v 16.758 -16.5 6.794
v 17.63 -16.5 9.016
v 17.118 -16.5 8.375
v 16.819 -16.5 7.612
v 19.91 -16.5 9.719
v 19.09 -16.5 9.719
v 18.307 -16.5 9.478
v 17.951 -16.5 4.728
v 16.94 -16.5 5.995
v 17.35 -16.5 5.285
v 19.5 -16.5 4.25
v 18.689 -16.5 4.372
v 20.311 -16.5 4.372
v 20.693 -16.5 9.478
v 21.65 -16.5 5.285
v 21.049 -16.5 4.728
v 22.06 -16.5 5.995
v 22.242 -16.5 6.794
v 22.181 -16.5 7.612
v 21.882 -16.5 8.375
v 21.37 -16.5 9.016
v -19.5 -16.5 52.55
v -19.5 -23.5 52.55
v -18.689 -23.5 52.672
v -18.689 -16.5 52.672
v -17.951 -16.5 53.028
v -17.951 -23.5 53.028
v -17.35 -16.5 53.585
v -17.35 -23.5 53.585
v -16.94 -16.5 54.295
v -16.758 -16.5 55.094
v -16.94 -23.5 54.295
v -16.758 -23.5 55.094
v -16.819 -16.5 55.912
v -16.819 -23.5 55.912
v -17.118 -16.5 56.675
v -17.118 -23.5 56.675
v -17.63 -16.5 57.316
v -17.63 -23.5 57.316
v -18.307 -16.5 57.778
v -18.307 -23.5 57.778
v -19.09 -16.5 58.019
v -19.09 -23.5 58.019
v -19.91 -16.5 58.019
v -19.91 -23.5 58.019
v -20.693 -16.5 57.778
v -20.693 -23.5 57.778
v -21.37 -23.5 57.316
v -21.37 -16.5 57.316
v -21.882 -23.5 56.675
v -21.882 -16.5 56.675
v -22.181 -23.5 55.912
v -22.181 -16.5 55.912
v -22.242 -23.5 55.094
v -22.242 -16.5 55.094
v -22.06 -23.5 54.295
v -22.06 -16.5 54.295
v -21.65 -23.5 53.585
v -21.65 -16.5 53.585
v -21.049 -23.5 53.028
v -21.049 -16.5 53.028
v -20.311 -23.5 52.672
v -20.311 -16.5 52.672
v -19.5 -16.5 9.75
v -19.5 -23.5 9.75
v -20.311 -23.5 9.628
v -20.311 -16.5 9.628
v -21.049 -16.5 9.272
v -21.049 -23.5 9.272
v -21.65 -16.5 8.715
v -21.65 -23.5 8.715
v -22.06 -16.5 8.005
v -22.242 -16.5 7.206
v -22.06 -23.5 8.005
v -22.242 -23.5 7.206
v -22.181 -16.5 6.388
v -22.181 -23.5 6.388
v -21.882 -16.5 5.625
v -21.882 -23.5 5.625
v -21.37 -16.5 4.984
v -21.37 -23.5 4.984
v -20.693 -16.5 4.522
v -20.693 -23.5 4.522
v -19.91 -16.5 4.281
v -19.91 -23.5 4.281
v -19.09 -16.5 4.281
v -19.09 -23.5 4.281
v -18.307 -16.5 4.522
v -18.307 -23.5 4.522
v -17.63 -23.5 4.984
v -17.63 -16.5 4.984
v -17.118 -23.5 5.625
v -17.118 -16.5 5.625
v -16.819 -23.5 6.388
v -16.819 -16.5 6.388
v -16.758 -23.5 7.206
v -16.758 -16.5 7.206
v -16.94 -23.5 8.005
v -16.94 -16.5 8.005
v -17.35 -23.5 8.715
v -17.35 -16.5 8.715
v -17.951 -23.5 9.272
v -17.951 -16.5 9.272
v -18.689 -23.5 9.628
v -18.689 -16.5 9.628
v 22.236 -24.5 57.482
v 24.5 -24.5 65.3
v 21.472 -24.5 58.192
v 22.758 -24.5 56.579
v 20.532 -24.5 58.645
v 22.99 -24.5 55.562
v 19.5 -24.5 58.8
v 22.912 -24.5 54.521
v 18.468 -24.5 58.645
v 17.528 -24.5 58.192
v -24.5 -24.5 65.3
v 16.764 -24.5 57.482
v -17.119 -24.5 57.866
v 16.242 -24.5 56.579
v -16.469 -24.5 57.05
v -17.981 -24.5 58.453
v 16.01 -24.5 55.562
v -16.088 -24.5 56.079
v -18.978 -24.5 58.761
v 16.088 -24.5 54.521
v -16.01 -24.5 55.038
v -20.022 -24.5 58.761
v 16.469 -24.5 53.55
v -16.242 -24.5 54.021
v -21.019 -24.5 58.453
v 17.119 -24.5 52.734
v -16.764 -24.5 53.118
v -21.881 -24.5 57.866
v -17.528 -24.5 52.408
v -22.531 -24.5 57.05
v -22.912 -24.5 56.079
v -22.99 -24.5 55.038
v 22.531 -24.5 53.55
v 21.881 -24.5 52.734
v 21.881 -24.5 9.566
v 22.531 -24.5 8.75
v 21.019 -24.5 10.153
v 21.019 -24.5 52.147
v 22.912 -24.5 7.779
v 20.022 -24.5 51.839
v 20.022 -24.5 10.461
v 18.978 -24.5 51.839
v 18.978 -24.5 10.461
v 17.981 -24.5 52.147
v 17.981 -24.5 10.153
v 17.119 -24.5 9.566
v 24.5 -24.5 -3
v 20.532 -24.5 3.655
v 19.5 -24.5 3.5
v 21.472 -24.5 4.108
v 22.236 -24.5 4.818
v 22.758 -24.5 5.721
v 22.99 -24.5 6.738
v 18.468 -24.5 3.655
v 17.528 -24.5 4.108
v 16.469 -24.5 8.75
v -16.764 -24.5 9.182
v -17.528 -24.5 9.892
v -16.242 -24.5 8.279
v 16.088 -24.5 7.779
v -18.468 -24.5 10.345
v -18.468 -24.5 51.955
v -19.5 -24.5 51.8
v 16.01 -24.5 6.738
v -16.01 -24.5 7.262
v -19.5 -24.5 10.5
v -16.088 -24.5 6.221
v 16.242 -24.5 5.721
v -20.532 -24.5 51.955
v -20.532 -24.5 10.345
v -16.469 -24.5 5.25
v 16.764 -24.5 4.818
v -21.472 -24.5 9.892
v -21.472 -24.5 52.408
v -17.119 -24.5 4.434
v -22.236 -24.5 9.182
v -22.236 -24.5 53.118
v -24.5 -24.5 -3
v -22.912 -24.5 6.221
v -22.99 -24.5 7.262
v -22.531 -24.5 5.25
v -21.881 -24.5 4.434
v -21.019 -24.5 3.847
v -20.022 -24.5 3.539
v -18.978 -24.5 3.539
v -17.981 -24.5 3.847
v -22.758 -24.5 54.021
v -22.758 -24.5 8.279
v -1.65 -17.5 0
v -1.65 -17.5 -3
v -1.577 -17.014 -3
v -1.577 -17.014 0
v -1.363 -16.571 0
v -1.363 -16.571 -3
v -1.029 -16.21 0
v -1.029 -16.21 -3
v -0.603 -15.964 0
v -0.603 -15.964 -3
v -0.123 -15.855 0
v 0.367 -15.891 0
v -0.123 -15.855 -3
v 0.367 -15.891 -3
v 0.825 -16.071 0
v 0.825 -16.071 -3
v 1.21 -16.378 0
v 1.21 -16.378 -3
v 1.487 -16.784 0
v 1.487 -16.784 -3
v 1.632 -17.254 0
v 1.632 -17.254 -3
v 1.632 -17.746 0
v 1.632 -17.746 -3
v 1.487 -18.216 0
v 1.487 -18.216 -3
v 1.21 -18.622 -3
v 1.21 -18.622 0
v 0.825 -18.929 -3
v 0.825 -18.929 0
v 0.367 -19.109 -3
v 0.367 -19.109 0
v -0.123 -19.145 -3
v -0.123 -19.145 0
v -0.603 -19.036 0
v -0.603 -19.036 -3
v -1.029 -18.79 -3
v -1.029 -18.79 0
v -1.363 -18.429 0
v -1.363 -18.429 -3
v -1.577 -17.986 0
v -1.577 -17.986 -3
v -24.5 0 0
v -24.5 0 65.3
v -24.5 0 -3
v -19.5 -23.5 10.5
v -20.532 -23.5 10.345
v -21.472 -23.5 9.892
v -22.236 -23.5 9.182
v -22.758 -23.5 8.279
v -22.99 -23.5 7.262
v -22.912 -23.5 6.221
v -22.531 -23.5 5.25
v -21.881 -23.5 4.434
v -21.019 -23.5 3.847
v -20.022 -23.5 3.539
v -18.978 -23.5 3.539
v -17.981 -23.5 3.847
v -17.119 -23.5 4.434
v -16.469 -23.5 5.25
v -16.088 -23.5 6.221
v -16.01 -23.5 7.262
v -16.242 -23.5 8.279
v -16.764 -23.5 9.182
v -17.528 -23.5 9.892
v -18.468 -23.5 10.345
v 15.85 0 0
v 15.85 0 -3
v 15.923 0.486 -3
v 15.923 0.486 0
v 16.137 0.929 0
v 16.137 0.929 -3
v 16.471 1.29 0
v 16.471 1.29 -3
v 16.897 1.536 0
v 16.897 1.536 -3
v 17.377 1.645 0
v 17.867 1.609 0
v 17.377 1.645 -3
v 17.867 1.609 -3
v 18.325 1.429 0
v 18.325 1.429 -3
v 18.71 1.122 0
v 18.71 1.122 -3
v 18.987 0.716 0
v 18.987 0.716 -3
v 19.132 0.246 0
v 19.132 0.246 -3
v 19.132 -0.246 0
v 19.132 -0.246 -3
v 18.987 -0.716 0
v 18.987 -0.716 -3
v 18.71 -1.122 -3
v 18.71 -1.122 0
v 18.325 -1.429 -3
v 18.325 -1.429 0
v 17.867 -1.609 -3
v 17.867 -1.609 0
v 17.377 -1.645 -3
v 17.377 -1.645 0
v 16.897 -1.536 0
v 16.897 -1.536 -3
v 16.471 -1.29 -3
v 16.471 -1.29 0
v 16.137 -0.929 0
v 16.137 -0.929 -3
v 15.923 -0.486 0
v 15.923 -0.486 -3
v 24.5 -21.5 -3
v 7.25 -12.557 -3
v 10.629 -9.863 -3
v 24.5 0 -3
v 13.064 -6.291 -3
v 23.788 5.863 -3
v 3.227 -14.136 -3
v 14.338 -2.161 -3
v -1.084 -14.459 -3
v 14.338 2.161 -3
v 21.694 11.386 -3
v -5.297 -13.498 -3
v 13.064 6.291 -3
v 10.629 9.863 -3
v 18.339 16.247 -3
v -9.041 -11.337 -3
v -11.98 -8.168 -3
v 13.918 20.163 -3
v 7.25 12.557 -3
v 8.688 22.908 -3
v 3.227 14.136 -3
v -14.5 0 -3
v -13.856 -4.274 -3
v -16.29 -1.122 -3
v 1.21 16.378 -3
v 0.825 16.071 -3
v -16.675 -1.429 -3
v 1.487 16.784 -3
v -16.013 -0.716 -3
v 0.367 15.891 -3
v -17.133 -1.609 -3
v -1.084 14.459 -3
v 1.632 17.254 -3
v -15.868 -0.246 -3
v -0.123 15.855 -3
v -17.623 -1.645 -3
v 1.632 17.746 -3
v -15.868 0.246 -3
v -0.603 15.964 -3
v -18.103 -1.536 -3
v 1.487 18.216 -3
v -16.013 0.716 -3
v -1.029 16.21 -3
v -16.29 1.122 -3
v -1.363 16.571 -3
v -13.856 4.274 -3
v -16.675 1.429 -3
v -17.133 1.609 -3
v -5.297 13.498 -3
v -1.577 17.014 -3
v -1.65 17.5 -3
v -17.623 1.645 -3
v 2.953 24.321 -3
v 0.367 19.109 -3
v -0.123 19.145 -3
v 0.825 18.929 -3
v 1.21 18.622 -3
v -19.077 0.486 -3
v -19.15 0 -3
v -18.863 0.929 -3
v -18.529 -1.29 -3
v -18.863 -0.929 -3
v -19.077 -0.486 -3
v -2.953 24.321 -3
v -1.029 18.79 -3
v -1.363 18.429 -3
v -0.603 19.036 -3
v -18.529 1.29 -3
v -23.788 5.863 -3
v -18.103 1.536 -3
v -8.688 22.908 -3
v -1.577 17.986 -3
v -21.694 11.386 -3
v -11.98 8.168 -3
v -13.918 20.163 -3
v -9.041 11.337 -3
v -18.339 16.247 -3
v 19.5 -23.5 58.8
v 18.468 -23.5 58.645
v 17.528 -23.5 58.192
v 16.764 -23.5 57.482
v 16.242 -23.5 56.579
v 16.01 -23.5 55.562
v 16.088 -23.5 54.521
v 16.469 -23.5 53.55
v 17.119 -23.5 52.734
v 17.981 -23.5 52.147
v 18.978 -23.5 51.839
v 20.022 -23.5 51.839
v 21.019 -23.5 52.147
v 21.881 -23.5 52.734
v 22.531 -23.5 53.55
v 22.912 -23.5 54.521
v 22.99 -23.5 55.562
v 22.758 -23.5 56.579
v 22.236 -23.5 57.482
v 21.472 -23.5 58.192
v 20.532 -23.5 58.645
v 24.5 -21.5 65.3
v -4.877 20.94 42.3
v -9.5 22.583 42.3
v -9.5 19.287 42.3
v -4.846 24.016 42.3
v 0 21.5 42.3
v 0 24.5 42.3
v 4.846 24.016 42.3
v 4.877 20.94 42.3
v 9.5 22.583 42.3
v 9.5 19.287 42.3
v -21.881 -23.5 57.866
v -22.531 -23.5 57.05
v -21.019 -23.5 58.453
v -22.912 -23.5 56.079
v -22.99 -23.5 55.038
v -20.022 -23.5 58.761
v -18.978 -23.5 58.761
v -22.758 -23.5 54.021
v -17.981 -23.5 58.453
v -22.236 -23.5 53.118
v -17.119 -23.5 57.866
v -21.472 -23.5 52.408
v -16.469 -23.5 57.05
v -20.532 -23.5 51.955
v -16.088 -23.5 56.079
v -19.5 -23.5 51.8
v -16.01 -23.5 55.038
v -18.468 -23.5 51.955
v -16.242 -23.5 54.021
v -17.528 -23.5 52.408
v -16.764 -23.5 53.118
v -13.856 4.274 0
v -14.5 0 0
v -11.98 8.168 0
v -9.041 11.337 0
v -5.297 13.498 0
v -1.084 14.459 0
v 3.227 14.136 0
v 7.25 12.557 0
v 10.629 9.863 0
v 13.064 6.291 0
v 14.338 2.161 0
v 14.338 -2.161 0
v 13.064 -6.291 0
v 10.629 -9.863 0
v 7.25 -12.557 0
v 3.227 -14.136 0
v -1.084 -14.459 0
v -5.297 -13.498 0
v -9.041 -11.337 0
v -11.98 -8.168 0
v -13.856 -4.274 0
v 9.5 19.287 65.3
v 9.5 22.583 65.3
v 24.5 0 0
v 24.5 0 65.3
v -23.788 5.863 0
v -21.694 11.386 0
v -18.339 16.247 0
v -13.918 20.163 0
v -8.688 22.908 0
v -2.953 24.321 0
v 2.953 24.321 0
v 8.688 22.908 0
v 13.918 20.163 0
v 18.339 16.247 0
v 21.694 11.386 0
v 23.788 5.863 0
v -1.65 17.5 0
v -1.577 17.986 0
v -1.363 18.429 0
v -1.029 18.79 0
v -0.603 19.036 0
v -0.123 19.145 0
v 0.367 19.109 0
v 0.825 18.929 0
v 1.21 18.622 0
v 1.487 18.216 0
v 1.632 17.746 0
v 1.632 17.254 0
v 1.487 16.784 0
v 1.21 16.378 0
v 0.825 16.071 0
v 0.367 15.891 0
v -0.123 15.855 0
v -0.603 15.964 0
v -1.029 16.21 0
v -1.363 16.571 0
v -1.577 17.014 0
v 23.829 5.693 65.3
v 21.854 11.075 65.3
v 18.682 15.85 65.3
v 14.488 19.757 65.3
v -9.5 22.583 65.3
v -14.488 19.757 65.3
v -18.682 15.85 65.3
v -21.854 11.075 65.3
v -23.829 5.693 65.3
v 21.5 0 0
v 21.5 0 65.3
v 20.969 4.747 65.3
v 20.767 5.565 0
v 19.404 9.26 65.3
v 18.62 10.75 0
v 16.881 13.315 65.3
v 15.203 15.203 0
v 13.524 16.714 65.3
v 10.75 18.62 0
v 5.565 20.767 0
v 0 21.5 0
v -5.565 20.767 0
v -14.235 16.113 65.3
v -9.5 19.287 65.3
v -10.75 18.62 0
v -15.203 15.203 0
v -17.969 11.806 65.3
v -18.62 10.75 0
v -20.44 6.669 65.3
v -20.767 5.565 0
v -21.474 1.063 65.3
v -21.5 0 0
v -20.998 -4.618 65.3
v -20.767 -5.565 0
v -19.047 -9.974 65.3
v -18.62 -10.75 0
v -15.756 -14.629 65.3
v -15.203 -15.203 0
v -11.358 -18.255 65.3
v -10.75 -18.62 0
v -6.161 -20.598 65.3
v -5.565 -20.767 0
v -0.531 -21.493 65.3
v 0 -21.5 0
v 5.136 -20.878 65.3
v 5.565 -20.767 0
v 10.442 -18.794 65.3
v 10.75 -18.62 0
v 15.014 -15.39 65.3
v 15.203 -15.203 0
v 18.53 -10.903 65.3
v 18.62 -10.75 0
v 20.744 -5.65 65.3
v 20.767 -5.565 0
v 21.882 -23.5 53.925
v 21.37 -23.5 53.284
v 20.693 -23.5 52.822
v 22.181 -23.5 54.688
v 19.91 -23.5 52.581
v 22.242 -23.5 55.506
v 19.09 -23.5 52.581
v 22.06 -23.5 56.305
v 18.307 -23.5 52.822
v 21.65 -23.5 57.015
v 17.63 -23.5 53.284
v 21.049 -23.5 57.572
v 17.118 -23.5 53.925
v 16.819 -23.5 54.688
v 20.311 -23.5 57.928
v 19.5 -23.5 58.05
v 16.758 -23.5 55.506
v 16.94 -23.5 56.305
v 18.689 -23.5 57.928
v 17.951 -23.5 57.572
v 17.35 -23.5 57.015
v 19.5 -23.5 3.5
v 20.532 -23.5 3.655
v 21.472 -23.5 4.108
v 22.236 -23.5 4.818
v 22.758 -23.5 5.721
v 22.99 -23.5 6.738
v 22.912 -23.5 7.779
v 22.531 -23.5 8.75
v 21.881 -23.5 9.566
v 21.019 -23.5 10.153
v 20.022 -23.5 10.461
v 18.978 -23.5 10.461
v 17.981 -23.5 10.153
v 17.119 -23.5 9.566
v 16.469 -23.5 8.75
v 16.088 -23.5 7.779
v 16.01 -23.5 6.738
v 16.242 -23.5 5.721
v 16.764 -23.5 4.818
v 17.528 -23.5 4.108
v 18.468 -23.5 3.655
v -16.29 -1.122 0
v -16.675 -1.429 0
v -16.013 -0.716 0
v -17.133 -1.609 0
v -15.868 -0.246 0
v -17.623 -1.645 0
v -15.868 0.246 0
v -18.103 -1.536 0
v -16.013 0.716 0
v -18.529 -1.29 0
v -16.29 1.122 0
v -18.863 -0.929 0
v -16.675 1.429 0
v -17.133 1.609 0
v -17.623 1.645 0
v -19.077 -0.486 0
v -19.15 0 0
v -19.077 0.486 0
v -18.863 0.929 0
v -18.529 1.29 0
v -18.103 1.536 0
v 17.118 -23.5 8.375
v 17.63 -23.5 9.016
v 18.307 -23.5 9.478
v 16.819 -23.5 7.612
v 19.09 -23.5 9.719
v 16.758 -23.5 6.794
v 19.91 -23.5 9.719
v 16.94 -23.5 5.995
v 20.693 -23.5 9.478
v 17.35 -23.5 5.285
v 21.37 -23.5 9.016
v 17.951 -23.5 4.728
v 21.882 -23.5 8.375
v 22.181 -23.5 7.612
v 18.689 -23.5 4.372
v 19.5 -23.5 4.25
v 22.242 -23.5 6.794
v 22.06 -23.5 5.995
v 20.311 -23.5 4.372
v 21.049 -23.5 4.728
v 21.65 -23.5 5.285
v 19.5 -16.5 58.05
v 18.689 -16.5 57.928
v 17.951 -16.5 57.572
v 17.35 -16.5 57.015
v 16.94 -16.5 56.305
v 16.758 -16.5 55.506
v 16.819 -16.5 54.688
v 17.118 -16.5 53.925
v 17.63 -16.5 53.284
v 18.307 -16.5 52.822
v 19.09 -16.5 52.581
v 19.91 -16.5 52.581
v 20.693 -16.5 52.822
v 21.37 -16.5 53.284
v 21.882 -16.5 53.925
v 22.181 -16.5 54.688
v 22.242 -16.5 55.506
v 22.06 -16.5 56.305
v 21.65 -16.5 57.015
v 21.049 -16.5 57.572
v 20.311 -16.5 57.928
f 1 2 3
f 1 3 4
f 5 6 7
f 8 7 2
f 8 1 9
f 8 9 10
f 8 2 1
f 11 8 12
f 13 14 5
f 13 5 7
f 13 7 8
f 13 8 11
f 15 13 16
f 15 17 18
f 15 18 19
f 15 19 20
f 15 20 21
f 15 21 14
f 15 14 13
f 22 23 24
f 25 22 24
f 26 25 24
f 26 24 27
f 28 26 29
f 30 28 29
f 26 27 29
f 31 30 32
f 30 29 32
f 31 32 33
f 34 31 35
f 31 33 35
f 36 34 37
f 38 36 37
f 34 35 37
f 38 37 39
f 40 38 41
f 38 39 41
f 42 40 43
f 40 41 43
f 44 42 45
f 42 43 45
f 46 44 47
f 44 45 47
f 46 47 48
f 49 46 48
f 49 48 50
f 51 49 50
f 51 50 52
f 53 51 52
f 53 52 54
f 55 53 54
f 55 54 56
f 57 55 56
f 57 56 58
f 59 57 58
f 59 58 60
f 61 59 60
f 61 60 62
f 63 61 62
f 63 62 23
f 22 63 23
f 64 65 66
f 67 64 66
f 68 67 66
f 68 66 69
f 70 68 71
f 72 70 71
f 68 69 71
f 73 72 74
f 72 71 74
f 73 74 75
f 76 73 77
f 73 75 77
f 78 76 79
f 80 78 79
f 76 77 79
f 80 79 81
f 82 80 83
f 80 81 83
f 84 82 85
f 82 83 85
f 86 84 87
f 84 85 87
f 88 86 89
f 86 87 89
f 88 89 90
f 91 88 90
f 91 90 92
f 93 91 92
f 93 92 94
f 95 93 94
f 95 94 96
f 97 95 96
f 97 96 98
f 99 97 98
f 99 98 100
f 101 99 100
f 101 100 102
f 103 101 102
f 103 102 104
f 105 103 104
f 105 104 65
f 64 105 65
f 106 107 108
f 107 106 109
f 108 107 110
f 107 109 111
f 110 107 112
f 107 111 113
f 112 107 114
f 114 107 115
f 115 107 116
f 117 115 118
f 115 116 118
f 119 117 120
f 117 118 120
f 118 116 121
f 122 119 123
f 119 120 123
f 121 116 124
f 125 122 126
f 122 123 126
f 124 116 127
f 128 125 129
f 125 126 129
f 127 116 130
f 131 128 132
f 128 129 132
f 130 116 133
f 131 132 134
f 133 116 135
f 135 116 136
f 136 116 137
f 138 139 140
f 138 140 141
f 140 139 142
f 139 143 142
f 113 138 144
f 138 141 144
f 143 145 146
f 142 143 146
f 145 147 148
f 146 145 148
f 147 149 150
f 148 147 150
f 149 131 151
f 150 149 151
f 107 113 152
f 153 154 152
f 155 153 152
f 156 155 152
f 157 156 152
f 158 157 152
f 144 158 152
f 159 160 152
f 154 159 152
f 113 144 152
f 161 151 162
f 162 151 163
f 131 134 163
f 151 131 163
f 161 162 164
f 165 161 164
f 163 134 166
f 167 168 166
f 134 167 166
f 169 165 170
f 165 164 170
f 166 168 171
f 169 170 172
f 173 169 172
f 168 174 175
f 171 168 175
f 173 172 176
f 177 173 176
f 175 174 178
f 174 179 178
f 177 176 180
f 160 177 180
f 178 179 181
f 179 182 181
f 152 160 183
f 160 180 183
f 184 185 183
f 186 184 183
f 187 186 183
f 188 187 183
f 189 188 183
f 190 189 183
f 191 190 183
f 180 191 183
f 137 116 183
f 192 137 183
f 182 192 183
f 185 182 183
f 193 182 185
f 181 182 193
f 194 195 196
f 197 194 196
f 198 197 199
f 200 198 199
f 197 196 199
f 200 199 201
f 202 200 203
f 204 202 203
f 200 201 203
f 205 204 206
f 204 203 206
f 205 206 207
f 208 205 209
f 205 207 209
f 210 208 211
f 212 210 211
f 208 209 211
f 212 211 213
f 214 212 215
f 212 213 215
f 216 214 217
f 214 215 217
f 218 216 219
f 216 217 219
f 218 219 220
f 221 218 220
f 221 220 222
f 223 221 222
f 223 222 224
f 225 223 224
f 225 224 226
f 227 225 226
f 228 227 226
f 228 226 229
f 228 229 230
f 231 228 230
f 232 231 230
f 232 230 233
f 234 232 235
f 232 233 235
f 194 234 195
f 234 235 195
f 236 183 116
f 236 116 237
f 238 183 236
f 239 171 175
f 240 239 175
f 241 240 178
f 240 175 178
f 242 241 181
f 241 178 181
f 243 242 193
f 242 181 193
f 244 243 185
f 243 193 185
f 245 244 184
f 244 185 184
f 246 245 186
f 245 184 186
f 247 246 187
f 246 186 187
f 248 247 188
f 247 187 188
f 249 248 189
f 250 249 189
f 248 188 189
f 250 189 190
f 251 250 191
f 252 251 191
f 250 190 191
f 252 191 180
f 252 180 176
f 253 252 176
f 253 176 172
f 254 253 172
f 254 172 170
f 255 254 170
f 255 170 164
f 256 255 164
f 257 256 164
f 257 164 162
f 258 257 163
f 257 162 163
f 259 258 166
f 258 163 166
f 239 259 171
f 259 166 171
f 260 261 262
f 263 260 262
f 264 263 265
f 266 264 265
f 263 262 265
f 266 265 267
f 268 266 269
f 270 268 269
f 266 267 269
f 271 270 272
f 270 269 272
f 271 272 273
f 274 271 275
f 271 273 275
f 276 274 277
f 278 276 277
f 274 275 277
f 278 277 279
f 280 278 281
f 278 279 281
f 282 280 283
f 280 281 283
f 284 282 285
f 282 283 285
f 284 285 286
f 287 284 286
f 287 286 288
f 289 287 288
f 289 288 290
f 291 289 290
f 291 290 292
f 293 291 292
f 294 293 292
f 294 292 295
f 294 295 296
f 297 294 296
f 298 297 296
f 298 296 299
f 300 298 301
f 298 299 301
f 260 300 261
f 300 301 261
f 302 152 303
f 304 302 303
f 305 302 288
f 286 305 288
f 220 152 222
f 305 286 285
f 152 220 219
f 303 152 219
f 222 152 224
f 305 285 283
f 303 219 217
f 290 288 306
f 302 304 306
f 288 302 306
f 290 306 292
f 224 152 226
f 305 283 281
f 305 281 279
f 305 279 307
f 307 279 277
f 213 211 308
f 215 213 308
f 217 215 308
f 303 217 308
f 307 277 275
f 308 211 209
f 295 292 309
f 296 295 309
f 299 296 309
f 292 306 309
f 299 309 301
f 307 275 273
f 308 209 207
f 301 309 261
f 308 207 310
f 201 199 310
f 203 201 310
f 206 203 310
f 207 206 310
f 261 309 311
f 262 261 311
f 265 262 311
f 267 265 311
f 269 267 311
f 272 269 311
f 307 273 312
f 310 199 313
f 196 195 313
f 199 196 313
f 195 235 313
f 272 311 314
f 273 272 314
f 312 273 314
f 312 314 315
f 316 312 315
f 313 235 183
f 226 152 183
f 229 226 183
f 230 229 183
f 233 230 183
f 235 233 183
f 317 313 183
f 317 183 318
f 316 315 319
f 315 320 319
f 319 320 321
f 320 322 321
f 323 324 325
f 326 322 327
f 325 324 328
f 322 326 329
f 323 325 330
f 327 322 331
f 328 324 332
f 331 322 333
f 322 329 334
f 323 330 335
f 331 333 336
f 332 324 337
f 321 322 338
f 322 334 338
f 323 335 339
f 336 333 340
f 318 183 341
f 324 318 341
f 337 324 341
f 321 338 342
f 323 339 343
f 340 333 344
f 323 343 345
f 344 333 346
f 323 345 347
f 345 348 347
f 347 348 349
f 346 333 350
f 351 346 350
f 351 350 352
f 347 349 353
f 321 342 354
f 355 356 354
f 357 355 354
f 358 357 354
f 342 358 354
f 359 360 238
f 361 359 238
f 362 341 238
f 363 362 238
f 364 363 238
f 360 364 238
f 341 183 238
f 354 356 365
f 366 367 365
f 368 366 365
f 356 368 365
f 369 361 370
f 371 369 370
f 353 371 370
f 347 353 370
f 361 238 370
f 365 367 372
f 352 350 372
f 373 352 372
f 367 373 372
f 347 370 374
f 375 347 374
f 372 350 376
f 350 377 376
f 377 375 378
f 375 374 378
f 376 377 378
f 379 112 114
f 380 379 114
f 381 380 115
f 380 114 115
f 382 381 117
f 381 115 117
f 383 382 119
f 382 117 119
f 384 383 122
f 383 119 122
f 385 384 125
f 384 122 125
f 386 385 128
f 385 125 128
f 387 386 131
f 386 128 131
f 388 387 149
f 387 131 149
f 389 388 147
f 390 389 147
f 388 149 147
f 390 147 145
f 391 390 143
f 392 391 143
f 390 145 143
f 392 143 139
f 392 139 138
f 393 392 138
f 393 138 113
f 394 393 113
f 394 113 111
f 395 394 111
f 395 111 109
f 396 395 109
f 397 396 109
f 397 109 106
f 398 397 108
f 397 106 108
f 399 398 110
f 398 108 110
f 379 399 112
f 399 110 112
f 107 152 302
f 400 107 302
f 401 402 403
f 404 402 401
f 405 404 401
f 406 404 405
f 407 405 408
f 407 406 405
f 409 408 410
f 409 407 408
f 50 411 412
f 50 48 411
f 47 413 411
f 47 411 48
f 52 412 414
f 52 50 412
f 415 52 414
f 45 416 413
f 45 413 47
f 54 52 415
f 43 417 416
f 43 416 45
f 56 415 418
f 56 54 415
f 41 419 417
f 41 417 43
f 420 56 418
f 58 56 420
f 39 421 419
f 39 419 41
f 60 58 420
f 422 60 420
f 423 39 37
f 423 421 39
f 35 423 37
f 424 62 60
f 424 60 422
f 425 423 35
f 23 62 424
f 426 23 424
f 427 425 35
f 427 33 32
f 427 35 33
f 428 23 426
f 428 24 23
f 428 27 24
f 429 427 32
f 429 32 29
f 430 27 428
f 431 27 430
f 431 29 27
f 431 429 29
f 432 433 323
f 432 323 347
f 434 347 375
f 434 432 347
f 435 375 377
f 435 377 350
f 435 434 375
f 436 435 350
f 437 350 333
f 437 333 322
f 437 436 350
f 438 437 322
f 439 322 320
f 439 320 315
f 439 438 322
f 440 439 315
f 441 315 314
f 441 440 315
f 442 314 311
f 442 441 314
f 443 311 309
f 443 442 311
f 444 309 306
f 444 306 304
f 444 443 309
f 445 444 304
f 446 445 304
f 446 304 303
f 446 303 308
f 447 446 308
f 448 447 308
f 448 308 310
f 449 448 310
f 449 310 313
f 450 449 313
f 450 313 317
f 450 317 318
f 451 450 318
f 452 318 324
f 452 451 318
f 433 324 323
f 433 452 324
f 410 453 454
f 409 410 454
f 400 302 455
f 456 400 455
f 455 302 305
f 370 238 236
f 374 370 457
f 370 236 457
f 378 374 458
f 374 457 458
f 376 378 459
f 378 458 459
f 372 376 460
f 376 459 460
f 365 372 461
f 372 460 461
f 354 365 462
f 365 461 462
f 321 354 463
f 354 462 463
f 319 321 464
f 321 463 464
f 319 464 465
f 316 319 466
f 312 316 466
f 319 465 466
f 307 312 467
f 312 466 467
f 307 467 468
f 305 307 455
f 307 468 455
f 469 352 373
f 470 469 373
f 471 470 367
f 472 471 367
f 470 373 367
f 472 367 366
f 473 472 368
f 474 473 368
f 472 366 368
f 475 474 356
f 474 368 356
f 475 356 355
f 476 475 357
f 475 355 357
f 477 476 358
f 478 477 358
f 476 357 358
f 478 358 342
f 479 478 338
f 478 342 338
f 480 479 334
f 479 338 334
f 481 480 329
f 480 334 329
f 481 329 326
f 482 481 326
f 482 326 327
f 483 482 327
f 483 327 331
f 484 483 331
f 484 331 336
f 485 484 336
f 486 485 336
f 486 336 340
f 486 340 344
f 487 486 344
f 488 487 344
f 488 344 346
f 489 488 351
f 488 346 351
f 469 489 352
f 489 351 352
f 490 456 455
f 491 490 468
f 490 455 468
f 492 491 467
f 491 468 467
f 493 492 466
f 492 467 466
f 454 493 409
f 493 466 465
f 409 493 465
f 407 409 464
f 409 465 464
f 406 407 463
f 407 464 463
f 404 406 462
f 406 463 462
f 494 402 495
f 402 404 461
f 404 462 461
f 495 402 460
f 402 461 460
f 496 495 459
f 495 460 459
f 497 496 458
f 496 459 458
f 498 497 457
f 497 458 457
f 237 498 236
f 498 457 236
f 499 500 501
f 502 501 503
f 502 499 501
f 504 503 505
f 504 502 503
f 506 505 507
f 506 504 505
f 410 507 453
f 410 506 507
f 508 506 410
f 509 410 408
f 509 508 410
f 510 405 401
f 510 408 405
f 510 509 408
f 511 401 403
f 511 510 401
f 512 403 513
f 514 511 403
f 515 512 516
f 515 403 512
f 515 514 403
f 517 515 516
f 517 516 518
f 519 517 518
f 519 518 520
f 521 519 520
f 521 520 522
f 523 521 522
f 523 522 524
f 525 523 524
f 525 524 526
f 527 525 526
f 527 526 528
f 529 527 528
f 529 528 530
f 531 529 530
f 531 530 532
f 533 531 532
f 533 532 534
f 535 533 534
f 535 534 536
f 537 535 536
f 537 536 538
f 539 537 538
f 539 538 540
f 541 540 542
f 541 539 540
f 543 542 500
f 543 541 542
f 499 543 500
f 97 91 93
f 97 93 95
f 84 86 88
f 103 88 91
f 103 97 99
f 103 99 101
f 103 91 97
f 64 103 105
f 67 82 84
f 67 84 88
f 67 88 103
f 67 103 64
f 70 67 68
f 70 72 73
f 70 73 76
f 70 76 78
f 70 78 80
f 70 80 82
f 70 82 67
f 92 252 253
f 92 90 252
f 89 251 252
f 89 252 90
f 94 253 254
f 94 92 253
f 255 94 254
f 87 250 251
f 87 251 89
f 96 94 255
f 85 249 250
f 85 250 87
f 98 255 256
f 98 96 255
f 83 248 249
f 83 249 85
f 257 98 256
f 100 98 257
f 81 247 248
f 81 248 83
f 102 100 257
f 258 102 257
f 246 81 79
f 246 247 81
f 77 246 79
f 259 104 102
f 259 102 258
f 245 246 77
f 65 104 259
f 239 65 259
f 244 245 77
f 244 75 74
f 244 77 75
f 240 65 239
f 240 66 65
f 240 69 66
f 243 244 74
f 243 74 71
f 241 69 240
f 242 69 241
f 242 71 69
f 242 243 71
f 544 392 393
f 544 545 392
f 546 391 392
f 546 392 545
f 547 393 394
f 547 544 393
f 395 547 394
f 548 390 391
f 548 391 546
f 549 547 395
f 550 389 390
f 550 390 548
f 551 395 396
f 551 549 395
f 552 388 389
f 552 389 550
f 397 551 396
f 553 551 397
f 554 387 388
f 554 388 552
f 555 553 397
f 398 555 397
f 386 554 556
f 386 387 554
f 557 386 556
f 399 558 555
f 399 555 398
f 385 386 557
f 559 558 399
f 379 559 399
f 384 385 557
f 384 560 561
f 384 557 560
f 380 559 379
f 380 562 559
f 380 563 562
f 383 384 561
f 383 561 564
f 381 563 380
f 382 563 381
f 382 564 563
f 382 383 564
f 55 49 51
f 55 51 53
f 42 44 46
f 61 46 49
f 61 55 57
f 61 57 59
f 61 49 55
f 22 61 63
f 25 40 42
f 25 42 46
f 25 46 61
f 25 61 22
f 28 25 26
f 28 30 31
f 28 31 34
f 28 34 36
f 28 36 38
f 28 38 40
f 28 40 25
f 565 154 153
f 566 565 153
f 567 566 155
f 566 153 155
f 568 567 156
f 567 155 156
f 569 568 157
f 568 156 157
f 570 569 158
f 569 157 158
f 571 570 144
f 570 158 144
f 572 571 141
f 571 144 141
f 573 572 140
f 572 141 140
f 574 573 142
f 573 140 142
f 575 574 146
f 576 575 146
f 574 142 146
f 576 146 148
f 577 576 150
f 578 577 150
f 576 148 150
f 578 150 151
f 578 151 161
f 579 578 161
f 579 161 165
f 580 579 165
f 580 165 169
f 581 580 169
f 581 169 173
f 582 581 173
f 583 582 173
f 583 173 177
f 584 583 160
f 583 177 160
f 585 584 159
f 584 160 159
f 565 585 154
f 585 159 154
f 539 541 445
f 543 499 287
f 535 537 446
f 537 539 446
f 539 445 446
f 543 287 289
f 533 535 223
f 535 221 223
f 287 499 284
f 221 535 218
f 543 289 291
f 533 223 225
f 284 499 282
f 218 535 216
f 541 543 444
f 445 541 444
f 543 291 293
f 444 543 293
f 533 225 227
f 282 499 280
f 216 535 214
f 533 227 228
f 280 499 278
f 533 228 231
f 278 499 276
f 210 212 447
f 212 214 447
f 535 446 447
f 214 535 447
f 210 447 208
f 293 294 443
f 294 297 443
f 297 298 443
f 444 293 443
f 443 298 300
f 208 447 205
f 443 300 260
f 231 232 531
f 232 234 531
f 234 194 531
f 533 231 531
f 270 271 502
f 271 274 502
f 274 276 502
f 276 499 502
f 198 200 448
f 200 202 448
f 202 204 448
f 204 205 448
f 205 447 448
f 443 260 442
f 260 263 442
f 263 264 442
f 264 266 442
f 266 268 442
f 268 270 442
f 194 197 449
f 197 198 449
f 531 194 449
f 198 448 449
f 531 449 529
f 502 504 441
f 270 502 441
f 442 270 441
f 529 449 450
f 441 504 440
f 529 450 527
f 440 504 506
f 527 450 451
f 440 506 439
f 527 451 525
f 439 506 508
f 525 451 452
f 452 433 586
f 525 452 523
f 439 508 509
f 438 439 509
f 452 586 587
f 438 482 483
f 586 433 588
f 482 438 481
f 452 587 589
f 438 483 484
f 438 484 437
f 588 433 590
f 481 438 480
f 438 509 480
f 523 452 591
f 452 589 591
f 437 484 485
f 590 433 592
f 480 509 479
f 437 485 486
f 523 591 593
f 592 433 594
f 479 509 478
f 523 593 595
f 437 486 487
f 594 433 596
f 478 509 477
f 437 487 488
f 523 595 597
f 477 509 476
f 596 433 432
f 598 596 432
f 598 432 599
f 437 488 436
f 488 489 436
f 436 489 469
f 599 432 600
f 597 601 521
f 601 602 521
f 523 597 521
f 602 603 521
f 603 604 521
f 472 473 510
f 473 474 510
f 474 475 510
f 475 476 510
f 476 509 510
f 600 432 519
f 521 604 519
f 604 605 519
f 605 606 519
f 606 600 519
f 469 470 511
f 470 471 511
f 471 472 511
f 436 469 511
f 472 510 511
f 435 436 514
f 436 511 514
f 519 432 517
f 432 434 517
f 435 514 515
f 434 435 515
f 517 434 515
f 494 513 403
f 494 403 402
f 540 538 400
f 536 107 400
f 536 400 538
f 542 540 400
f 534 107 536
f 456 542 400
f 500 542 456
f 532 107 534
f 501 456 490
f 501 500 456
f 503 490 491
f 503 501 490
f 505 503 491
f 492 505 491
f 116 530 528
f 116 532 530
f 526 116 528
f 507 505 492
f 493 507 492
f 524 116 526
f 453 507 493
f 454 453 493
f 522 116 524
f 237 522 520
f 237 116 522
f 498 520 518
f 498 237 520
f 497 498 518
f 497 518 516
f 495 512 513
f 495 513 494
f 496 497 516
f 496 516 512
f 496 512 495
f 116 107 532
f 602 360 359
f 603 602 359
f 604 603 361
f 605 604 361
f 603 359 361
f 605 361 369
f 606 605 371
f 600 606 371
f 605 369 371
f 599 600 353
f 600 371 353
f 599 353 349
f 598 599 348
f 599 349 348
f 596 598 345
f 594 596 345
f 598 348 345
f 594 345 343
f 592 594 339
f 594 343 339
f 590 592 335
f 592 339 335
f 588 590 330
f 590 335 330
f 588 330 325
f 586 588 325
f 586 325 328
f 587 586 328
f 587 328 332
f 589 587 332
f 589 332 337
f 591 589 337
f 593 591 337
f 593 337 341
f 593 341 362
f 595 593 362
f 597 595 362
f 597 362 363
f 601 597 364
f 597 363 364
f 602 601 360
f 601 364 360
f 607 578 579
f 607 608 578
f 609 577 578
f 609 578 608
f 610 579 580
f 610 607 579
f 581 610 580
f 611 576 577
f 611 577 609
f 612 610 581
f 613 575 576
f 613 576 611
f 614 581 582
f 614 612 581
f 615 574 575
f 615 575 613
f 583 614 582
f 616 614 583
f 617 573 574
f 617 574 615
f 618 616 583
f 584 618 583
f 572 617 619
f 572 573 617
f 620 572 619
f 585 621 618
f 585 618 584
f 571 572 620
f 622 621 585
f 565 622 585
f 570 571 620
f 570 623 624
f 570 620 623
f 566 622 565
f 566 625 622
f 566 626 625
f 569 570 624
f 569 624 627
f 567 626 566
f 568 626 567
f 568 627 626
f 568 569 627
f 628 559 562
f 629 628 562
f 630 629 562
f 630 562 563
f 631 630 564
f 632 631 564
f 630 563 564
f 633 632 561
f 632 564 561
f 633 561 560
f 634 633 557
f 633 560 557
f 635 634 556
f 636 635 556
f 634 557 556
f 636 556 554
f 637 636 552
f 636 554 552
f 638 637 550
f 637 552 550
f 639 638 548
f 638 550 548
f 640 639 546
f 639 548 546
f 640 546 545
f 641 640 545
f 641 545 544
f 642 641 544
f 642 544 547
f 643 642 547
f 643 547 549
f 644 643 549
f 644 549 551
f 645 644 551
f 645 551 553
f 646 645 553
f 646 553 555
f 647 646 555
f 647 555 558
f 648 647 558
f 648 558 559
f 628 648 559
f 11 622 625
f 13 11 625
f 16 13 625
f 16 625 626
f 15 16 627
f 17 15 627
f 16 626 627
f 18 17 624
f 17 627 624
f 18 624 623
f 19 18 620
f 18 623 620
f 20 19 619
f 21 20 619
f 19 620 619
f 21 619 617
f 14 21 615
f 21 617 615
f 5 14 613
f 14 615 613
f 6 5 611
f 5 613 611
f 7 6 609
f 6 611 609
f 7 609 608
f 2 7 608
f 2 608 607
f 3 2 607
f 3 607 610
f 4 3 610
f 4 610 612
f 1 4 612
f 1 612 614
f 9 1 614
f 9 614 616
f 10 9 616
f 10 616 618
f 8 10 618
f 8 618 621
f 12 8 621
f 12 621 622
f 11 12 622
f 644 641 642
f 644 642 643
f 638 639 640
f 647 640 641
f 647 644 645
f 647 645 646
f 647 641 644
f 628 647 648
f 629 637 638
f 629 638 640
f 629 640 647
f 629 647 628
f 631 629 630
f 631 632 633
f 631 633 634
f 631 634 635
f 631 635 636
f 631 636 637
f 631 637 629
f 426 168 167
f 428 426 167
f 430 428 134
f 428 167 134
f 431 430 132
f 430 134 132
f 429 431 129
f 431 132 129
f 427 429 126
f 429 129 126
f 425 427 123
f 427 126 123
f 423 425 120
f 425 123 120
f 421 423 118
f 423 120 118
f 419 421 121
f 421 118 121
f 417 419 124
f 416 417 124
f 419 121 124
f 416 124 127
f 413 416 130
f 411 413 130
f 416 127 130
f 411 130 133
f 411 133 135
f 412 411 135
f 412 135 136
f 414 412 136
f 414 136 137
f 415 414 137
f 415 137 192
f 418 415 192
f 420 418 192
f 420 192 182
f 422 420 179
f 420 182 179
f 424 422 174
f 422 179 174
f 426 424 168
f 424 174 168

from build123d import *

# Parameters (mm, degrees)
ESQUISSE1_R             = 24.5
ESQUISSE1_R_2           = 21.5
BOSS_EXTRU_1_DEPTH      = 65.3
ESQUISSE2_R             = 21.5
ESQUISSE2_R_2           = 14.5
BOSS_EXTRU_2_DEPTH      = 3
ESQUISSE3_R             = 1.65
ENL_V_MAT_EXTRU_1_DEPTH = 3
ESQUISSE4_W             = 19
ESQUISSE4_H             = 5.738367338
ENL_V_MAT_EXTRU_2_DEPTH = 23
ESQUISSE5_W             = 68.3
ESQUISSE5_H             = 3
BOSS_EXTRU_3_DEPTH      = 17
ESQUISSE6_W             = 68.3
ESQUISSE6_H             = 3
BOSS_EXTRU_4_DEPTH      = 17
ESQUISSE7_R             = 2
ENL_V_MAT_EXTRU_3_DEPTH = 10
ESQUISSE9_R             = 2
ENL_V_MAT_EXTRU_4_DEPTH = 10
ESQUISSE10_R            = 3.5
ENL_V_MAT_EXTRU_5_DEPTH = 1
ESQUISSE11_R            = 2.75
ENL_V_MAT_EXTRU_6_DEPTH = 8
ESQUISSE12_W            = 17
ESQUISSE12_H            = 3
ENL_V_MAT_EXTRU_7_DEPTH = 74


with BuildPart() as part:
    # Esquisse1 → Boss.-Extru.1 (new body)
    with BuildSketch(Plane.XY):
        Circle(ESQUISSE1_R)
        Circle(ESQUISSE1_R_2, mode=Mode.SUBTRACT)
        with BuildLine():
            Line((-24.5, 0), (-24.5, -24.5))
            Line((-24.5, -24.5), (-6e-09, -24.5))
            ThreePointArc((-6e-09, -24.5), (-17.324116141, -17.324116137), (-24.5, 0))
        make_face()
        with BuildLine():
            ThreePointArc((24.5, 0), (17.324116137, -17.324116141), (-6e-09, -24.5))
            Line((-6e-09, -24.5), (24.5, -24.5))
            Line((24.5, -24.5), (24.5, 0))
        make_face()
    extrude(amount=BOSS_EXTRU_1_DEPTH)

    # Esquisse2 → Boss.-Extru.2 (add)
    with BuildSketch(Plane(origin=(0, 0, 0), x_dir=(-1, 0, 0), z_dir=(0, 0, -1))):
        with BuildLine():
            ThreePointArc((24.5, 0), (0, 24.5), (-24.5, 0))
            ThreePointArc((-24.5, 0), (-17.324116141, -17.324116137), (-6e-09, -24.5))
            ThreePointArc((-6e-09, -24.5), (17.324116137, -17.324116141), (24.5, 0))
        make_face()
        with Locations(Location((0, 0, 0), (0, 0, 180))):
            Circle(ESQUISSE2_R, mode=Mode.SUBTRACT)
        with Locations(Location((0, 0, 0), (0, 0, 180))):
            Circle(ESQUISSE2_R)
        Circle(ESQUISSE2_R_2, mode=Mode.SUBTRACT)
        with BuildLine():
            ThreePointArc((-6e-09, -24.5), (-17.324116141, -17.324116137), (-24.5, 0))
            Line((-24.5, 0), (-24.5, -24.5))
            Line((-24.5, -24.5), (-6e-09, -24.5))
        make_face()
        with BuildLine():
            Line((24.5, -24.5), (24.5, 0))
            ThreePointArc((24.5, 0), (17.324116137, -17.324116141), (-6e-09, -24.5))
            Line((-6e-09, -24.5), (24.5, -24.5))
        make_face()
    extrude(amount=BOSS_EXTRU_2_DEPTH)

    # Esquisse3 → Enlèv. mat.-Extru.1 (cut)
    with BuildSketch(Plane(origin=(0, 0, -3), x_dir=(-1, 0, 0), z_dir=(0, 0, -1))):
        with Locations((-17.5, 0)):
            Circle(ESQUISSE3_R)
        with Locations((17.5, 0)):
            Circle(ESQUISSE3_R)
        with Locations((0, 17.5)):
            Circle(ESQUISSE3_R)
        with Locations((0, -17.5)):
            Circle(ESQUISSE3_R)
    extrude(amount=-ENL_V_MAT_EXTRU_1_DEPTH, mode=Mode.SUBTRACT)

    # Esquisse4 → Enlèv. mat.-Extru.2 (cut)
    with BuildSketch(Plane.XY.offset(65.3)):
        with Locations((0, 22.156485191)):
            Rectangle(ESQUISSE4_W, ESQUISSE4_H)
    extrude(amount=-ENL_V_MAT_EXTRU_2_DEPTH, mode=Mode.SUBTRACT)

    # Esquisse5 → Boss.-Extru.3 (add)
    with BuildSketch(Plane.ZY.offset(24.5)):
        with Locations((31.15, -23)):
            Rectangle(ESQUISSE5_W, ESQUISSE5_H)
    extrude(amount=BOSS_EXTRU_3_DEPTH)

    # Esquisse6 → Boss.-Extru.4 (add)
    with BuildSketch(Plane(origin=(24.5, 0, 0), x_dir=(0, 0, -1), z_dir=(1, 0, 0))):
        with Locations((-31.15, -23)):
            Rectangle(ESQUISSE6_W, ESQUISSE6_H)
    extrude(amount=BOSS_EXTRU_4_DEPTH)

    # Esquisse7 → Enlèv. mat.-Extru.3 (cut)
    with BuildSketch(Plane(origin=(0, -21.5, 0), x_dir=(1, 0, 0), z_dir=(0, 1, 0))):
        with Locations(Location((-33, -7, 0), (0, 0, 270))):
            Circle(ESQUISSE7_R)
        with Locations(Location((-33, -55.3, 0), (0, 0, 270))):
            Circle(ESQUISSE7_R)
    extrude(amount=-ENL_V_MAT_EXTRU_3_DEPTH, mode=Mode.SUBTRACT)

    # Esquisse9 → Enlèv. mat.-Extru.4 (cut)
    with BuildSketch(Plane(origin=(0, -21.5, 0), x_dir=(1, 0, 0), z_dir=(0, 1, 0))):
        with Locations(Location((33, -7, 0), (0, 0, 270))):
            Circle(ESQUISSE9_R)
        with Locations(Location((33, -55.3, 0), (0, 0, 270))):
            Circle(ESQUISSE9_R)
    extrude(amount=-ENL_V_MAT_EXTRU_4_DEPTH, mode=Mode.SUBTRACT)

    # Esquisse10 → Enlèv. mat.-Extru.5 (cut)
    with BuildSketch(Plane.XZ.offset(24.5)):
        with Locations(Location((-19.5, 55.3, 0), (0, 0, 270))):
            Circle(ESQUISSE10_R)
        with Locations(Location((19.5, 55.3, 0), (0, 0, 90))):
            Circle(ESQUISSE10_R)
        with Locations(Location((19.5, 7, 0), (0, 0, 270))):
            Circle(ESQUISSE10_R)
        with Locations(Location((-19.5, 7, 0), (0, 0, 90))):
            Circle(ESQUISSE10_R)
    extrude(amount=-ENL_V_MAT_EXTRU_5_DEPTH, mode=Mode.SUBTRACT)

    # Esquisse11 → Enlèv. mat.-Extru.6 (cut)
    with BuildSketch(Plane.XZ.offset(24.5)):
        with Locations(Location((-19.5, 55.3, 0), (0, 0, 270))):
            Circle(ESQUISSE11_R)
        with Locations(Location((19.5, 55.3, 0), (0, 0, 90))):
            Circle(ESQUISSE11_R)
        with Locations(Location((19.5, 7, 0), (0, 0, 270))):
            Circle(ESQUISSE11_R)
        with Locations(Location((-19.5, 7, 0), (0, 0, 90))):
            Circle(ESQUISSE11_R)
    extrude(amount=-ENL_V_MAT_EXTRU_6_DEPTH, mode=Mode.SUBTRACT)

    # Esquisse12 → Enlèv. mat.-Extru.7 (cut)
    with BuildSketch(Plane(origin=(0, 0, -3), x_dir=(-1, 0, 0), z_dir=(0, 0, -1))):
        with Locations((-33, -23)):
            Rectangle(ESQUISSE12_W, ESQUISSE12_H)
        with Locations((33, -23)):
            Rectangle(ESQUISSE12_W, ESQUISSE12_H)
    extrude(amount=-ENL_V_MAT_EXTRU_7_DEPTH, mode=Mode.SUBTRACT)


solid = part.part
